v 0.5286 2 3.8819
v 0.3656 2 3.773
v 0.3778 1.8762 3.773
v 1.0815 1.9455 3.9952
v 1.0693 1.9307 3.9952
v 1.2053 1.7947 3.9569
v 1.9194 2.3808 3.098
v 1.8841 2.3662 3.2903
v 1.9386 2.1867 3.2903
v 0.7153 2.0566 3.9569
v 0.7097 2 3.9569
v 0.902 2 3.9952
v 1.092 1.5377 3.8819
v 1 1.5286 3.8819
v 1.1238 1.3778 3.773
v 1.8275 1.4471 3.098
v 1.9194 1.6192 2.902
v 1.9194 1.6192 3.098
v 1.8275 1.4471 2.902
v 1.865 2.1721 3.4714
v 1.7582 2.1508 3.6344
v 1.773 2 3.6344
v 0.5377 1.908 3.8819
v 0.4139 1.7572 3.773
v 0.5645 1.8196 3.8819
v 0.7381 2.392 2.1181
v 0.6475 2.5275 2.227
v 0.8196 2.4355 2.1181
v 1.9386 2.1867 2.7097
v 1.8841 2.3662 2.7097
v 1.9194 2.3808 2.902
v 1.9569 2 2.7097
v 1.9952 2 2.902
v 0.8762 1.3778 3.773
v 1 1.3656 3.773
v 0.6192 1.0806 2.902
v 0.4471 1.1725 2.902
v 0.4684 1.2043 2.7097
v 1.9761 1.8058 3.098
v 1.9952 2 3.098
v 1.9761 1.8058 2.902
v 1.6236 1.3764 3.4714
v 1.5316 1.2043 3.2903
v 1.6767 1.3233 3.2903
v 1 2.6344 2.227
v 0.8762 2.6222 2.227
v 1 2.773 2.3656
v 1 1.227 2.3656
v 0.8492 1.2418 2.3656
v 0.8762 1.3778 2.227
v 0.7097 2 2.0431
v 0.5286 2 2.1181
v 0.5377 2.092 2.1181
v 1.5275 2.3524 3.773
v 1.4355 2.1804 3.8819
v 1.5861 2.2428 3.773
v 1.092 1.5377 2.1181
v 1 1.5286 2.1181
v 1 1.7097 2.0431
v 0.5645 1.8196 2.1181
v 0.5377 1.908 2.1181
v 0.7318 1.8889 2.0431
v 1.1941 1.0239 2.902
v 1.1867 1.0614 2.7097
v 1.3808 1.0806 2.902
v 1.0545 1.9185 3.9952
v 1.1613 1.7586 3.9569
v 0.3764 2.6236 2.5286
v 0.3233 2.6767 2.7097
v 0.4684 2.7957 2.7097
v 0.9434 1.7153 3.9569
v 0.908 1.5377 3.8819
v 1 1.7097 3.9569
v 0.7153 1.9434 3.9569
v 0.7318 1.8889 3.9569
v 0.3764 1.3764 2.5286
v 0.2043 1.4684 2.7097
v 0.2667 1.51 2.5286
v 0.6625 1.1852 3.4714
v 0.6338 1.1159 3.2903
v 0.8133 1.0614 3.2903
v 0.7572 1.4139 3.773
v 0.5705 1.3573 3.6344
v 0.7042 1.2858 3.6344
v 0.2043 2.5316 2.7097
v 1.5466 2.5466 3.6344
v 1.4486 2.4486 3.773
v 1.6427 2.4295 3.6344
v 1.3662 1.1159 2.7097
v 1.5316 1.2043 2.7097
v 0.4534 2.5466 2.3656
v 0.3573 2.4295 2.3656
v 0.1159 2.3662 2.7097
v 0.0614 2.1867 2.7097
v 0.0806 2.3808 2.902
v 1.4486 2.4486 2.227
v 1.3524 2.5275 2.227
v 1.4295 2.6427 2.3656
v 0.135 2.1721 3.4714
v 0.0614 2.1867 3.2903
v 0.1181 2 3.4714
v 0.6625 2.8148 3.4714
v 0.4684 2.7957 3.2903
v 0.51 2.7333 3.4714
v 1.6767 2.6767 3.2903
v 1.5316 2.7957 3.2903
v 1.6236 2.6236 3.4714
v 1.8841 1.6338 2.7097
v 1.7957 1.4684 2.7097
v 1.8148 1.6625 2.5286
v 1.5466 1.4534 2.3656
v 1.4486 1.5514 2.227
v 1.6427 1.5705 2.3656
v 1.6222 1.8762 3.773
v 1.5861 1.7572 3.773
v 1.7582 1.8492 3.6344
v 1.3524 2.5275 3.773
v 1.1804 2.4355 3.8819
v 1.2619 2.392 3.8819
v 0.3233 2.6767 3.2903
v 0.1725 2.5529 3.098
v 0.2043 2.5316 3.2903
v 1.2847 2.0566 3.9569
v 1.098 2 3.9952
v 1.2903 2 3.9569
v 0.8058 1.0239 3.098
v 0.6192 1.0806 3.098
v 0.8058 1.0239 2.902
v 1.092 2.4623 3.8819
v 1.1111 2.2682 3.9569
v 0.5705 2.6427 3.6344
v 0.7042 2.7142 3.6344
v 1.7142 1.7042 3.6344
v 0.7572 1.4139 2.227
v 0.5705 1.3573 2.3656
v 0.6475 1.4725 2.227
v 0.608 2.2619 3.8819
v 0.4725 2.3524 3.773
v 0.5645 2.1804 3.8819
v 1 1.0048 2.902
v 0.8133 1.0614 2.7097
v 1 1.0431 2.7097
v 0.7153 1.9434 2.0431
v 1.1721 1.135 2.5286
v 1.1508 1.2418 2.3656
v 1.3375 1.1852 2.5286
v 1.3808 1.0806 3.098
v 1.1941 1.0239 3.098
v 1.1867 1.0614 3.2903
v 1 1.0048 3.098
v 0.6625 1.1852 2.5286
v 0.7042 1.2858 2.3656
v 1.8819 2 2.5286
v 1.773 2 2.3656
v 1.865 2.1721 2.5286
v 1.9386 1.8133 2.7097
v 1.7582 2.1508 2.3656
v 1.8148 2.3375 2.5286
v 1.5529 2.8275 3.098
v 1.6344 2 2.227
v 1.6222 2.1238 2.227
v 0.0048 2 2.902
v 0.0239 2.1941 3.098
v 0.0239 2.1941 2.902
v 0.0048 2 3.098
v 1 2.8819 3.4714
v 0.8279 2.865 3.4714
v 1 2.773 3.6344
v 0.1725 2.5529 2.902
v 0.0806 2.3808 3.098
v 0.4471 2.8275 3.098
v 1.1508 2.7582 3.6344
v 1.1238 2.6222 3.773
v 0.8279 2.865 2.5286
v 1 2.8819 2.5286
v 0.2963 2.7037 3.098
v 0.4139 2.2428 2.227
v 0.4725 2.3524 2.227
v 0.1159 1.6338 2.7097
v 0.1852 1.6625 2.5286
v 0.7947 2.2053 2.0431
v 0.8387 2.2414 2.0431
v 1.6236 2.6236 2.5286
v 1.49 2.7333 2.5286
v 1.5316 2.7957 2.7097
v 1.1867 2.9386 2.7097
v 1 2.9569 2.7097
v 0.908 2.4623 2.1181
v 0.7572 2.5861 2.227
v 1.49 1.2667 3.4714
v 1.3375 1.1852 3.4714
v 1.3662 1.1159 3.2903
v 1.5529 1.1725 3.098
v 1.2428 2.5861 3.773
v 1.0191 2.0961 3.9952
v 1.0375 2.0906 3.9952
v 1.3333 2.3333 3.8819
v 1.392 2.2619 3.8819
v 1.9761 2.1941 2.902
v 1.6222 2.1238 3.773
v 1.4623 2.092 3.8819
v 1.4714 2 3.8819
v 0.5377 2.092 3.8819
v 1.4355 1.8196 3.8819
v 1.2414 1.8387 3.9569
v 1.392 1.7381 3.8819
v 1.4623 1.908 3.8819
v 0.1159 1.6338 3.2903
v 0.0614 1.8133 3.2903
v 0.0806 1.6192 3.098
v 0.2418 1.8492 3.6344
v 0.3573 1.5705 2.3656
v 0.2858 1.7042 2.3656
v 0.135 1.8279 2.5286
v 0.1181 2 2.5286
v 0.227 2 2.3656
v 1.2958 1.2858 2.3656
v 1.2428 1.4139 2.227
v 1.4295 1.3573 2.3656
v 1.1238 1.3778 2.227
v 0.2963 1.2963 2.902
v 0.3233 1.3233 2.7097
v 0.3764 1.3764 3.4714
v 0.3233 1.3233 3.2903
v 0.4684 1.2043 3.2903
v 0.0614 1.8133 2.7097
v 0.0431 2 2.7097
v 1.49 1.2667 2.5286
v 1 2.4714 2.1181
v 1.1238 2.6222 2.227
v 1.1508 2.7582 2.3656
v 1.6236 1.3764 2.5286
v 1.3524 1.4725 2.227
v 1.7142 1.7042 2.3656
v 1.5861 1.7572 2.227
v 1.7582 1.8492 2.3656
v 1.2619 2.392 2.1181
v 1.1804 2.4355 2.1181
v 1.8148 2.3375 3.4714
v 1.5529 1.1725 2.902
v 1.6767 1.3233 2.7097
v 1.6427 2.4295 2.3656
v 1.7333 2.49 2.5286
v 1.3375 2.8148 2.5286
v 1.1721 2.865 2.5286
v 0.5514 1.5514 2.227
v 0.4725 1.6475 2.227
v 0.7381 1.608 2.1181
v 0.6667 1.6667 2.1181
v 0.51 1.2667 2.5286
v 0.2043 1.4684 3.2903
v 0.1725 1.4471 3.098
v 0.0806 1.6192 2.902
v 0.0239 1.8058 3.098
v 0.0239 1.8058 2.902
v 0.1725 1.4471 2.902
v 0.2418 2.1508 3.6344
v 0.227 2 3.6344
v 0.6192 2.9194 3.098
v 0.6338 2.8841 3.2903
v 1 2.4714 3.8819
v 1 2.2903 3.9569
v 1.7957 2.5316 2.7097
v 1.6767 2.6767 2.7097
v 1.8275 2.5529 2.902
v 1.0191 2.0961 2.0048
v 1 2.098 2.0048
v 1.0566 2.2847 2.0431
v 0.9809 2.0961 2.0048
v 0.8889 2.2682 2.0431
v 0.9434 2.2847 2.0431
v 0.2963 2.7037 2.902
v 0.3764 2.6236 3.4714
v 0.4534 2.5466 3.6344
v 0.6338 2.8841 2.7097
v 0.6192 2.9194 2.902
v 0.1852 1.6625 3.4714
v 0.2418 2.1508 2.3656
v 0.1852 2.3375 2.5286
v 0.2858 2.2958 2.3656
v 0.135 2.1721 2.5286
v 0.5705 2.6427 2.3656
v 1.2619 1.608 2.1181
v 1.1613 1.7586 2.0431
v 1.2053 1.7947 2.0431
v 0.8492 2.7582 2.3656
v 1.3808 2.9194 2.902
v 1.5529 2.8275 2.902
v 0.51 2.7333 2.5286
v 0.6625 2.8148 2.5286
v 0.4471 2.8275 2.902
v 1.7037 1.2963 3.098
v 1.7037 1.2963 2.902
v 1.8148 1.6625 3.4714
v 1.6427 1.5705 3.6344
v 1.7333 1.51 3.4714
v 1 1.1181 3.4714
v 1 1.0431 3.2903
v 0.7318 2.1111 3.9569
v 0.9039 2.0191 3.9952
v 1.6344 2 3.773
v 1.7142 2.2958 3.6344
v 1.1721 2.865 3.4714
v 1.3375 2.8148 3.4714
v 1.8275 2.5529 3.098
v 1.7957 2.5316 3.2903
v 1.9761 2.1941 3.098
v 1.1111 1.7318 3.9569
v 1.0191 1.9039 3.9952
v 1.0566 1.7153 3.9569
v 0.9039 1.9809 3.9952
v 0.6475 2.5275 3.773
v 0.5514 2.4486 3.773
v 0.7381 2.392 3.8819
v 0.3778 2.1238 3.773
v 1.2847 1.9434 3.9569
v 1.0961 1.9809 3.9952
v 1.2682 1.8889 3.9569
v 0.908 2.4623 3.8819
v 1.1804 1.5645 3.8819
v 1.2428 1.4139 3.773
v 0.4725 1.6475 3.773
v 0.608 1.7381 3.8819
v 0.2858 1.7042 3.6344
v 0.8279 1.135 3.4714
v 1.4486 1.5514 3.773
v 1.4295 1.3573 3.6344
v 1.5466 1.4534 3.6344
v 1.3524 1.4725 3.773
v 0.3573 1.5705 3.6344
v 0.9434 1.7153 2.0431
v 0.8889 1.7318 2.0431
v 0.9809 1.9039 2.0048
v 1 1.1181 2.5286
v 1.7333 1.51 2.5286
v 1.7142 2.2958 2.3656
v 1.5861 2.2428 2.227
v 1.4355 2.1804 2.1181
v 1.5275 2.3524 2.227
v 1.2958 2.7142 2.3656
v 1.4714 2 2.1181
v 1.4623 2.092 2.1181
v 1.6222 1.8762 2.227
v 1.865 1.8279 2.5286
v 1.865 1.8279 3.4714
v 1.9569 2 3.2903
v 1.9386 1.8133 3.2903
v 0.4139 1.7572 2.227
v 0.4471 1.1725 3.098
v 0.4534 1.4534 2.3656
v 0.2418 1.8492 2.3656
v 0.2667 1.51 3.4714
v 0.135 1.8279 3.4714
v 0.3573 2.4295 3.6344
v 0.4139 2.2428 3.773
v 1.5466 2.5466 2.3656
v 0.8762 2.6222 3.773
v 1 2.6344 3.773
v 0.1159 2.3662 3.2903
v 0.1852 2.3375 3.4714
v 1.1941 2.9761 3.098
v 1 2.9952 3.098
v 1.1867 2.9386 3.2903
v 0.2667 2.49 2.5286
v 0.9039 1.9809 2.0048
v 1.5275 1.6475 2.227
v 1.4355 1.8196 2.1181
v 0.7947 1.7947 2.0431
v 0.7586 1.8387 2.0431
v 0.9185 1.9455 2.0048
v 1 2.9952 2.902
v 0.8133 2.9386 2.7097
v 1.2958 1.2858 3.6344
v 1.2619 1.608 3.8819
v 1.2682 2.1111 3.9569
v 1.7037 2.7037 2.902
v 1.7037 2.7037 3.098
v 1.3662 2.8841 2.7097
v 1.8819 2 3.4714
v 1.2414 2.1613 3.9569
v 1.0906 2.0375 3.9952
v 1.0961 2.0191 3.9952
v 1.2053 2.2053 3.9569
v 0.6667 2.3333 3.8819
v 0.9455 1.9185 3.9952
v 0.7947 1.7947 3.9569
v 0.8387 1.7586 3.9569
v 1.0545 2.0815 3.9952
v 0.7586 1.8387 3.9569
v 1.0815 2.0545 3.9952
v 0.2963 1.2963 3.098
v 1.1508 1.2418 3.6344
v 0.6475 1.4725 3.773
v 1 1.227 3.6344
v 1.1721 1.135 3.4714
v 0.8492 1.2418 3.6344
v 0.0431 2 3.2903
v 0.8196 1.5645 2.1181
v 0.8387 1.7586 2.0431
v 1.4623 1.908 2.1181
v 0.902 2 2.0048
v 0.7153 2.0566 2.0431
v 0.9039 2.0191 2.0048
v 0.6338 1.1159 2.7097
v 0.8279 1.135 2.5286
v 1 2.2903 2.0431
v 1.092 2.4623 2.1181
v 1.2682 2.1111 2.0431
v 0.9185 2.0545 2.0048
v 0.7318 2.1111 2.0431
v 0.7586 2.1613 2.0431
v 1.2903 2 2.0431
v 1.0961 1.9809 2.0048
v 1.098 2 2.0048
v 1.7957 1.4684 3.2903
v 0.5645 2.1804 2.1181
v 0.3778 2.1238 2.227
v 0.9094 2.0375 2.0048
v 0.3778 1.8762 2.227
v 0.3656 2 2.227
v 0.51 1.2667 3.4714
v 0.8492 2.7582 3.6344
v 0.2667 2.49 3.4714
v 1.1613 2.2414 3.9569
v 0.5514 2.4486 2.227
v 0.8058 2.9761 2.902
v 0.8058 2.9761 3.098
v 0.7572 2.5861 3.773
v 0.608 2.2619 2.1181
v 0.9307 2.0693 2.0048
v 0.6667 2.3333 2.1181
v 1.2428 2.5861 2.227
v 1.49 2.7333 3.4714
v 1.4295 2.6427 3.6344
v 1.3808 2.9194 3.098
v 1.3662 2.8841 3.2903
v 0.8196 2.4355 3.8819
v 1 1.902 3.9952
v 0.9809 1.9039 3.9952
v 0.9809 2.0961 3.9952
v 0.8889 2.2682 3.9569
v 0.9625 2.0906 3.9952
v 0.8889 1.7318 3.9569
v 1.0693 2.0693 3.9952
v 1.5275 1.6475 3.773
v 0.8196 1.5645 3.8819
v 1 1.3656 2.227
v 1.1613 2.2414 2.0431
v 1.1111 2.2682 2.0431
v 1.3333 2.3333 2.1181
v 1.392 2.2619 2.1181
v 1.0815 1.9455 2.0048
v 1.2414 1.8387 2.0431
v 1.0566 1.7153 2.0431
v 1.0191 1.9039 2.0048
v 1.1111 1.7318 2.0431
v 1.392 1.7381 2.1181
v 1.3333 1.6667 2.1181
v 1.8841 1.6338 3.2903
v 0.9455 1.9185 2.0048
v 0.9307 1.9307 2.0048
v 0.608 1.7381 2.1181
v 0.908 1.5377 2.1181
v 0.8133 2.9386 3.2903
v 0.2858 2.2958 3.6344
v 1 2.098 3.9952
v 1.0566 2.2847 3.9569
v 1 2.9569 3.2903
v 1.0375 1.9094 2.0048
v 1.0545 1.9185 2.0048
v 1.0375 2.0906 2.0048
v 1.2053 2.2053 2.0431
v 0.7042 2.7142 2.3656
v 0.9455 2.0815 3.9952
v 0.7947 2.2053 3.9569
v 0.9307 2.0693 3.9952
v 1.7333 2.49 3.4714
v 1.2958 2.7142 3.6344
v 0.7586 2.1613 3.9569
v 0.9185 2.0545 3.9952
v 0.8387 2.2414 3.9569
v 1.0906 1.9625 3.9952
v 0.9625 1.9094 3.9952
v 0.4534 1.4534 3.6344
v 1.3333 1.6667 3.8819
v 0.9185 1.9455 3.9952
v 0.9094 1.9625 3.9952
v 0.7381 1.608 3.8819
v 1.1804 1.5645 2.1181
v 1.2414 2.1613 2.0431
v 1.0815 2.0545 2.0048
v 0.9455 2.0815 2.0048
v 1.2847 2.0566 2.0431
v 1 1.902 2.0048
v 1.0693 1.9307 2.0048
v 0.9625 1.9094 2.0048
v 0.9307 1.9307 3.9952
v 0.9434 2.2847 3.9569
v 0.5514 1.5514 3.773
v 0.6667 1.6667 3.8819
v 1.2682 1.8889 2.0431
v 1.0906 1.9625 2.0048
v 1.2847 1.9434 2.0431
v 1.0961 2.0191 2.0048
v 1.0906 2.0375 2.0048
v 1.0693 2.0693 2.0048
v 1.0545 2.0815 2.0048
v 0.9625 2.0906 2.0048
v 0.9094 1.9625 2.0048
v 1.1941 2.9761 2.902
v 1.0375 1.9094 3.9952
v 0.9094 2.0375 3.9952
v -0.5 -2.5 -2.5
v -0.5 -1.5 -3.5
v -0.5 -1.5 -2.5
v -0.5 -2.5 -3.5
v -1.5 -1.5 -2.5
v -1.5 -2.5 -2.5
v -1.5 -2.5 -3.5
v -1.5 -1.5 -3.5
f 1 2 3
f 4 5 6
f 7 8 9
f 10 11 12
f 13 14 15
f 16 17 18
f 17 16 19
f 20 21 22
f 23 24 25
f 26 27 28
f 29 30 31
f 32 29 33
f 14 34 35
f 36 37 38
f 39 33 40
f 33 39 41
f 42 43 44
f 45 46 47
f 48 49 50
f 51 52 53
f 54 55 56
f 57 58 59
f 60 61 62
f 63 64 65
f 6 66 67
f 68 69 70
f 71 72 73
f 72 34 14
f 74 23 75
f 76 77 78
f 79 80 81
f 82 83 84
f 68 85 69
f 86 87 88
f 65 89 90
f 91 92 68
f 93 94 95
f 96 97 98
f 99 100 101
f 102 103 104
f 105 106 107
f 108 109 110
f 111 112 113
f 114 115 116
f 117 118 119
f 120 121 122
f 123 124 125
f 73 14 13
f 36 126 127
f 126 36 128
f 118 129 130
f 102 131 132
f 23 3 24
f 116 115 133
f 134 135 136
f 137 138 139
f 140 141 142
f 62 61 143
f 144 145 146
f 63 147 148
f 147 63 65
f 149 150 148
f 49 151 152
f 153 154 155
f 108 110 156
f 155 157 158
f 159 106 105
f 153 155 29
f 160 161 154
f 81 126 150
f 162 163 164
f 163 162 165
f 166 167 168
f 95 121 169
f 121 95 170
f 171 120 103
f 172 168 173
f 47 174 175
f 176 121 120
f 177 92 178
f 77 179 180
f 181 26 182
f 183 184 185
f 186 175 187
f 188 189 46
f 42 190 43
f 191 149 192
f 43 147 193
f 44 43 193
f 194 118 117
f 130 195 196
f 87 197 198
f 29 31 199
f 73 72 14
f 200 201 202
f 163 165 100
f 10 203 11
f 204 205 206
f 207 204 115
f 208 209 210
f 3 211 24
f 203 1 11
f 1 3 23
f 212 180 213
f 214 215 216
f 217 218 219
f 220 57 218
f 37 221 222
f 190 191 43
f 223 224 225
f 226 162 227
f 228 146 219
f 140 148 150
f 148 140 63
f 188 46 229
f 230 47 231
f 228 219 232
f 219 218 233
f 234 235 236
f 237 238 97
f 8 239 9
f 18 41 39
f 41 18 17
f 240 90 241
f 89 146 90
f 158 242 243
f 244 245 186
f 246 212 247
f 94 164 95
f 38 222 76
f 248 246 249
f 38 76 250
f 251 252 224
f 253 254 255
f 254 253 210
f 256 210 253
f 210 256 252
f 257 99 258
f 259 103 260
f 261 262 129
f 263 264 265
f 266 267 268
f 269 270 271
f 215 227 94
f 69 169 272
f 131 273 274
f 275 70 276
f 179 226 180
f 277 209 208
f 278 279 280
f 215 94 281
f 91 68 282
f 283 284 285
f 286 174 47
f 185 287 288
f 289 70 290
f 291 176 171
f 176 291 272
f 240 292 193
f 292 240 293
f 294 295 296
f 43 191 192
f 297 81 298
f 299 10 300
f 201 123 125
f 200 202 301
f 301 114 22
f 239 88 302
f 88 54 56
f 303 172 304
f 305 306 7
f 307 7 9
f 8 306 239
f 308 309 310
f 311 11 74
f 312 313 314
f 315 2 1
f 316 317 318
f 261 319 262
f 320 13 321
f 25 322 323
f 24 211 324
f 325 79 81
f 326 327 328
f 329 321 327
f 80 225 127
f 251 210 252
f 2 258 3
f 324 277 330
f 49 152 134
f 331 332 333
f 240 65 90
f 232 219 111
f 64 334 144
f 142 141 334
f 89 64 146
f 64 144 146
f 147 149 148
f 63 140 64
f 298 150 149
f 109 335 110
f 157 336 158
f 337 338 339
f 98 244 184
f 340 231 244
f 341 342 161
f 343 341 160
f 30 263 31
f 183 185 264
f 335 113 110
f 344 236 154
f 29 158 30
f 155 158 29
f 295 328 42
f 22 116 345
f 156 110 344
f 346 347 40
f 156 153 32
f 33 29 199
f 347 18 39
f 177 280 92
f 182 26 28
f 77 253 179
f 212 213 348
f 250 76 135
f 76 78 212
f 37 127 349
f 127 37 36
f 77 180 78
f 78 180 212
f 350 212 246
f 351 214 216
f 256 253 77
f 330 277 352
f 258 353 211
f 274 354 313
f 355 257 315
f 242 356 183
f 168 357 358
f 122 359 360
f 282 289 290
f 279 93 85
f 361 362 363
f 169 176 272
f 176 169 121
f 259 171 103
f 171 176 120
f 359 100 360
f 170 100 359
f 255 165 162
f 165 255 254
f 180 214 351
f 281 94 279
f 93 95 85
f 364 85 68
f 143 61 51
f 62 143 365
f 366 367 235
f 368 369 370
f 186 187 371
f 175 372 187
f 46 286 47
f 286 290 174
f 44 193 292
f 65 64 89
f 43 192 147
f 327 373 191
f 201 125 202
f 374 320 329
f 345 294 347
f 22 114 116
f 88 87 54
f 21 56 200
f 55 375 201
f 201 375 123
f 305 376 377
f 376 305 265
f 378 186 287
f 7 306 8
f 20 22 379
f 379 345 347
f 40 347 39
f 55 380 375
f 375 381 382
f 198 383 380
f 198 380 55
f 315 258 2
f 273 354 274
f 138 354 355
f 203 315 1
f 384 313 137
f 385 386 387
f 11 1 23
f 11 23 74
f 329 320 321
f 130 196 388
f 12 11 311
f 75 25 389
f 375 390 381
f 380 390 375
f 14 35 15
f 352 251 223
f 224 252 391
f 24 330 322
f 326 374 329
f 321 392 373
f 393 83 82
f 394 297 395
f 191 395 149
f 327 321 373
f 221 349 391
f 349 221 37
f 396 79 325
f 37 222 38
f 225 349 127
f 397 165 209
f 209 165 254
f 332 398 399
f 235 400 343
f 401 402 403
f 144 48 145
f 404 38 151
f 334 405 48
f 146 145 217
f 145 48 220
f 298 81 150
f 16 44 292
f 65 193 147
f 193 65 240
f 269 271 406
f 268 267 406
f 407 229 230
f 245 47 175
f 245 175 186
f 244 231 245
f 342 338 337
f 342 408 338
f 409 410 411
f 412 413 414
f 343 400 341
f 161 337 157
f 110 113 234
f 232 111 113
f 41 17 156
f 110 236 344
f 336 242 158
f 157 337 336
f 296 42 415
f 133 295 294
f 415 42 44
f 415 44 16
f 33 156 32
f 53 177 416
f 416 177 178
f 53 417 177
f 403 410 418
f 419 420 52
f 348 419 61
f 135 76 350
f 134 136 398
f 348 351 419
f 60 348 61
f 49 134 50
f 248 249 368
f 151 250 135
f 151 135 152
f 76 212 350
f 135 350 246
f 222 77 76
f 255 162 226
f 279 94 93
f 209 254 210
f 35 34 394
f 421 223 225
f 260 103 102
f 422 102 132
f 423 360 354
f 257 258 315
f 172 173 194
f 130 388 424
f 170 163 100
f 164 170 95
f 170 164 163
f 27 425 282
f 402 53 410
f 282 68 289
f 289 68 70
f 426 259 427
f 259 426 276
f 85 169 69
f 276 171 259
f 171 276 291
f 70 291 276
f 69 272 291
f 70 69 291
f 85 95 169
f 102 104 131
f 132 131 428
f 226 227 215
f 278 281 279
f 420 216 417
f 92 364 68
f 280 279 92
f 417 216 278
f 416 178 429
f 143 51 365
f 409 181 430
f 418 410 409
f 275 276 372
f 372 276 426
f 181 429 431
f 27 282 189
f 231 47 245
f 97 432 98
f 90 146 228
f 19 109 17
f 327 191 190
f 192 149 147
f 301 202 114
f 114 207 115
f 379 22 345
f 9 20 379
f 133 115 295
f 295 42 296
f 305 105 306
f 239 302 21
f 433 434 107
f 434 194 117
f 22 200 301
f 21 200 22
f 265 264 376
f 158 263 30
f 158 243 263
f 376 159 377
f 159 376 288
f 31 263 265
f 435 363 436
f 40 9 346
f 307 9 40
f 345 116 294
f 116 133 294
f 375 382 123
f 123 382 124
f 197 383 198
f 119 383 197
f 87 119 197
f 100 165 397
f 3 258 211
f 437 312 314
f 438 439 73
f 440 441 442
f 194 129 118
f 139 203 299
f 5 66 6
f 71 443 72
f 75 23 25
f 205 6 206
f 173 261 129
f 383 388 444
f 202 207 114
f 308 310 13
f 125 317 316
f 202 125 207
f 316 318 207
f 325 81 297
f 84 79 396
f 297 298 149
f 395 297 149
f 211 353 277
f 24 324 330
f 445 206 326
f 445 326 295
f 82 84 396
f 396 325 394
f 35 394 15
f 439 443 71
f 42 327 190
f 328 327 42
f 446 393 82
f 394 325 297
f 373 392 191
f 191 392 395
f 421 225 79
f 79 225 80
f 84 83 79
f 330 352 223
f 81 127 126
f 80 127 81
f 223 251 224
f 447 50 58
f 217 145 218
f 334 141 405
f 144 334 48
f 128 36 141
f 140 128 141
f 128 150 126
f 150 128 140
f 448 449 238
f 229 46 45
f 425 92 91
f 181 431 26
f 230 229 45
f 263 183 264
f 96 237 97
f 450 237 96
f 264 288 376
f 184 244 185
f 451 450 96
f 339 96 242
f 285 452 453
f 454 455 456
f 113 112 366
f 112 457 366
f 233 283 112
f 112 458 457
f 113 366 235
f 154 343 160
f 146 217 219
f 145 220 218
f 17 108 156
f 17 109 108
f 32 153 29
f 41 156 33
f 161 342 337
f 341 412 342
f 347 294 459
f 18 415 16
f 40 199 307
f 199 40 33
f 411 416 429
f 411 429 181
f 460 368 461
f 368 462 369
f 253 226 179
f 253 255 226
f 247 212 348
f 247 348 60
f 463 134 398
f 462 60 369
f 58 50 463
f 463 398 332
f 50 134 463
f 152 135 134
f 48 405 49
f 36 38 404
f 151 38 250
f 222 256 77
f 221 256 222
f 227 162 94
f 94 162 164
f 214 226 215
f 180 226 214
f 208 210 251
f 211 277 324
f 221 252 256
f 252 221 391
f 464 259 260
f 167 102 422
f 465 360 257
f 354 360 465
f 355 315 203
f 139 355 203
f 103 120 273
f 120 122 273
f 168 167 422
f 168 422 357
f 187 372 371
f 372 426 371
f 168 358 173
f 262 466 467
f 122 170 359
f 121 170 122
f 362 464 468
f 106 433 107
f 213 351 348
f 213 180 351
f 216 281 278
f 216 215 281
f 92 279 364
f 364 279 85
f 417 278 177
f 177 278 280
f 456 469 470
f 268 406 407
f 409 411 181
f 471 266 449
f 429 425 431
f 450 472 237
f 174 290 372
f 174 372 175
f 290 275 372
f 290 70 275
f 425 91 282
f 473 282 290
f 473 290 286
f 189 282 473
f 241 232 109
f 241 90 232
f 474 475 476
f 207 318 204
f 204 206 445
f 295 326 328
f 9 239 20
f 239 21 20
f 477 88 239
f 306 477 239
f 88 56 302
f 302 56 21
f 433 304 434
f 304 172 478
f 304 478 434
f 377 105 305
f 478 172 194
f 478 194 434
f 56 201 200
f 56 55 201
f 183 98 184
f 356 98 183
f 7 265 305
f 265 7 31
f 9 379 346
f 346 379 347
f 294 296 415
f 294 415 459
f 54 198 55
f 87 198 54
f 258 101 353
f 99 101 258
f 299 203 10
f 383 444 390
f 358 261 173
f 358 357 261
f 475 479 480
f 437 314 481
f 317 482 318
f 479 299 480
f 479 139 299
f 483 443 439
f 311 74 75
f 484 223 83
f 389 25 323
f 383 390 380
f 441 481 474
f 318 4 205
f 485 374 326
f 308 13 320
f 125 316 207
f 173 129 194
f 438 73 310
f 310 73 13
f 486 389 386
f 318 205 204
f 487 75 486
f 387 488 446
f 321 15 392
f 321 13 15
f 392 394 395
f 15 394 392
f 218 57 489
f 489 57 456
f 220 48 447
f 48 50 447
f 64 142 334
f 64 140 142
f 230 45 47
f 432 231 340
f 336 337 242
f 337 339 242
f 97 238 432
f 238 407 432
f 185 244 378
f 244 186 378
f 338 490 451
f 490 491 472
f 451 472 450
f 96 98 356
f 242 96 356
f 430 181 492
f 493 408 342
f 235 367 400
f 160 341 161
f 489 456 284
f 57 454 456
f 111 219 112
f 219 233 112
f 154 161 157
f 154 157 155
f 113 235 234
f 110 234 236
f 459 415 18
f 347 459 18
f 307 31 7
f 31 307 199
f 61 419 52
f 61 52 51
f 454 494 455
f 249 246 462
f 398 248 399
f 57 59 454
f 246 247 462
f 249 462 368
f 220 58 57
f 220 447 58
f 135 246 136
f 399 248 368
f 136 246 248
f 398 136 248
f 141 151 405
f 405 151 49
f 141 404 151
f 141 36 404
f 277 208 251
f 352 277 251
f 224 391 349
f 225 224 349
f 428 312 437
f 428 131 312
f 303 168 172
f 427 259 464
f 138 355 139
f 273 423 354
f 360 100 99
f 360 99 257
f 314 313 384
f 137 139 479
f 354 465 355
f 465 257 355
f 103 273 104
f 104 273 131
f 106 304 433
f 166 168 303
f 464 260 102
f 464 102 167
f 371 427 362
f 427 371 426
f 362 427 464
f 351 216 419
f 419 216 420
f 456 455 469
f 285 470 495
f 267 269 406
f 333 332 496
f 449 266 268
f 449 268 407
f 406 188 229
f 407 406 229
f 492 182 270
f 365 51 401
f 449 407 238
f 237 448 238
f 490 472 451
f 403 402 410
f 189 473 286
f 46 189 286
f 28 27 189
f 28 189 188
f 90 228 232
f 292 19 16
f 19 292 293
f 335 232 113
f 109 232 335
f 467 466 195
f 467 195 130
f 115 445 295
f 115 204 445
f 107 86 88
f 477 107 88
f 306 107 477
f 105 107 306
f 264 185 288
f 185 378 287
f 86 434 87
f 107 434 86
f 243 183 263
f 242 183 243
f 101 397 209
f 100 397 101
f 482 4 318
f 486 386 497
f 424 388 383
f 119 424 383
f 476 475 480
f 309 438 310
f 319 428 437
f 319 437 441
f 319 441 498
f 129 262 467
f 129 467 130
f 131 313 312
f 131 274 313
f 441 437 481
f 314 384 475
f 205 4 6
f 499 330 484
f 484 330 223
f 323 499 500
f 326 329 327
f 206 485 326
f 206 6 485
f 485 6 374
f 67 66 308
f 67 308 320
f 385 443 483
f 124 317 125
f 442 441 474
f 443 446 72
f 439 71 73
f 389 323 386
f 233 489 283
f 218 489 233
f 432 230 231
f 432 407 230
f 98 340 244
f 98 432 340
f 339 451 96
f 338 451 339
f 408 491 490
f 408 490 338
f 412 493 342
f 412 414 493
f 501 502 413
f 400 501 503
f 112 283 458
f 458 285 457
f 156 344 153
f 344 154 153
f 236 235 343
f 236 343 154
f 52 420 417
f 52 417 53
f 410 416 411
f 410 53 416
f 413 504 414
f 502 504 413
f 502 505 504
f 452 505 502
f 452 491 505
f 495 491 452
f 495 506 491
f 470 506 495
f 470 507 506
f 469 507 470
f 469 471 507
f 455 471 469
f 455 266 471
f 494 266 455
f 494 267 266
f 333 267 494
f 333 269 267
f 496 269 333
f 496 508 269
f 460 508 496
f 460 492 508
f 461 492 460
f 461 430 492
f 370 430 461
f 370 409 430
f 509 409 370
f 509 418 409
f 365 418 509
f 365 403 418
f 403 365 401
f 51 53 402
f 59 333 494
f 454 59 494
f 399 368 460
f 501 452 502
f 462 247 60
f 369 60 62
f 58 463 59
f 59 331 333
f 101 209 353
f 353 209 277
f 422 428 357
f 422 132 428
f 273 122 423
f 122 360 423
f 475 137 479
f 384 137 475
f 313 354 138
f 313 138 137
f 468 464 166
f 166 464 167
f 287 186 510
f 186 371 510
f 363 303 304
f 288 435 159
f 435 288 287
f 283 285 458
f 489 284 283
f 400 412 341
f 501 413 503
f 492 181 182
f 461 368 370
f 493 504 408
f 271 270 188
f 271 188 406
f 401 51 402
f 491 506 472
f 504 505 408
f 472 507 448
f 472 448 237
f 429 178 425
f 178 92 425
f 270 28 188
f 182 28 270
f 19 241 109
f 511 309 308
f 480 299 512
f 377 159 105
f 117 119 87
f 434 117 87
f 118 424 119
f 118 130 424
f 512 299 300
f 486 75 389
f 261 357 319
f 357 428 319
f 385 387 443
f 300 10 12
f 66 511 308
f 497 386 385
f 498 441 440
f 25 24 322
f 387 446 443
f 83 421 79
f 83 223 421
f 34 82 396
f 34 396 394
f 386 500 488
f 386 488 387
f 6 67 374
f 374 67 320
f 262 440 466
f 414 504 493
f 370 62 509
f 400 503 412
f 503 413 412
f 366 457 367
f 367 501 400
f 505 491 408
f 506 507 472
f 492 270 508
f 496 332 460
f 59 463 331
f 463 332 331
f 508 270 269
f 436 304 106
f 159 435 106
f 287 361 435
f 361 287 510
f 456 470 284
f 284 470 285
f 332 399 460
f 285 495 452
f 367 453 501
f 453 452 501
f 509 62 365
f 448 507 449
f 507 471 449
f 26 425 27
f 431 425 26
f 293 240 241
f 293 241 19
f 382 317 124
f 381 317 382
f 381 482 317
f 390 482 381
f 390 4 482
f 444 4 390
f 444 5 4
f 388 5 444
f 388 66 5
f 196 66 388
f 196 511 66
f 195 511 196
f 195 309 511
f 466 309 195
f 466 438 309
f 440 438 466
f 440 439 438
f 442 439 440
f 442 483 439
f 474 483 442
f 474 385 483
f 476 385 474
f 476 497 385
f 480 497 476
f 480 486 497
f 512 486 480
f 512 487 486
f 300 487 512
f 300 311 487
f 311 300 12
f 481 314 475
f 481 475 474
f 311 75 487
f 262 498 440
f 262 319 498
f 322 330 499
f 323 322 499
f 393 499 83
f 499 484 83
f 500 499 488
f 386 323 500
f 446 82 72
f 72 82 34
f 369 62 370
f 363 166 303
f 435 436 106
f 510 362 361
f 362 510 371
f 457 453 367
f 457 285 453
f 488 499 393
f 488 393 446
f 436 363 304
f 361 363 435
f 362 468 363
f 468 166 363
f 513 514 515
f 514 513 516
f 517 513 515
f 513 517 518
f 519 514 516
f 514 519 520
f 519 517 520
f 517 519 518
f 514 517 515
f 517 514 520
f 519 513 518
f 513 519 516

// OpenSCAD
// file: Scon.scad
function scon_value(data,path,default = function(path) undef,dist = 0) =
  (len(path) <= dist || is_undef(data)) ?
    (is_undef(data) ? default(path) : data) :
    let (
      key = path[dist],
      next = is_undef(key) ?
        data :
	is_string(key) ?
          _scon_map(data, key, path) :
          _scon_index(data, key, path)
    ) scon_value(next, path, default, dist + 1);

function _scon_map(map, key, path) =
    let (result = search([key], map,0)[0])
      len(result) > 0 ? map[result[len(result)-1]][1] : undef;

function _scon_index(list, index, path) =
    (is_list(list) && 0 <= index && index < len(list)) ? list[index] : undef;

function _scon_is_mapping(data) =
    is_list(data) && len(data) == 2 && is_string(data[0]);


function _scon_all_seq(seq,begin,end) =
  begin >= end ? true : seq(begin) && _scon_all_seq(seq,begin+1,end);

function _scon_is_map(data) =
    is_list(data) &&
    _scon_all_seq(function(i) _scon_is_mapping(data[i]),0,len(data));

scon_make = function(scon,base=undef)
  is_undef(base) ?
    function(path,missing=undef)
      scon_value(scon,path,function (missing_path) missing)
  :
    function(path,missing=undef)
      scon_value(scon,path,function (missing_path) base(missing_path,missing));


function _scon_str_seq(seq,begin,end) = // str(seq(begin),...,seq(end-1))
  let (n = (begin < end) ? end - begin : 0,
       m = ((n % 2) == 0) ? n/2 : (n-1) / 2)
  n > 1 ? str(_scon_str_seq(seq,begin,begin+m),_scon_str_seq(seq,begin+m,end)) :
  n == 1 ? str(seq(begin)) : "";

function _scon_str_list(list,begin=0,_end=undef) =
  let (seq = function (i) list[i],end = is_undef(_end) ? len(list) : _end)
  str_seq(seq,begin,end);

// sep can also be a lamba function of the index
function _scon_str_join_seq(seq,begin,end,sep=",") =
  let (n = (begin < end) ? end - begin : 0,
       m = ((n % 2) == 0) ? n/2 : (n-1) / 2)
  n > 1 ? str(_scon_str_join_seq(seq,begin,begin+m,sep),is_function(sep) ? sep(begin+m-1) : sep,_scon_str_join_seq(seq,begin+m,end,sep)) :
  n == 1 ? str(seq(begin)) : "";

function _scon_str_join_list(list,begin=0,_end=undef,sep=",") =
  let (seq = function (i) list[i],end = is_undef(_end) ? len(list) : _end)
  _scon_str_join_seq(seq,begin,end,sep);

function _scon_idigit(number,radix,position) =
  floor(number / pow(radix,position)) % radix;

function _scon_sdigit(number,radix,position) =
  let (digit = _scon_idigit(number,radix,position))
  (digit < 10 ? chr(ord("0")+digit) : chr(ord("a")-10+digit));

function _scon_hex(number,digits) = 
  _scon_str_seq(function(i) _scon_sdigit(number,16,digits-1-i),0,digits);
  
function _scon_json_chr(c) =
  (c == "\"") ? "\\\"" :
  (c == "\'") ? "\\\'" :
  (c == "\n") ? "\\n" :
  (c == "\r") ? "\\r" :
  (c == "\t") ? "\\t" :
  (ord(c) >= 32 && ord(c) <= 127) ? c :
  (ord(c) < 128) ? str("\\x",_scon_hex(ord(c),2)) :
  (ord(c) < 65536) ? str("\\u",_scon_hex(ord(c),4)) :
  str("\\U",_scon_hex(ord(c),6));
  
function _scon_json_str(scon) =
  let (seq=function (i) _scon_json_chr(scon[i]))
  str("\"",_scon_str_seq(seq,0,len(scon)),"\"");

function _scon_json_map(scon) =
  let(seq=function(i) str(_scon_json_str(scon[i][0]),":",scon_json(scon[i][1])))
  str("{",_scon_str_join_seq(seq,0,len(scon)),"}");

function _scon_json_list(scon) =
  let(seq=function(i) scon_json(scon[i]))
  str("[",_scon_str_join_seq(seq,0,len(scon)),"]");

function scon_json(scon) =
  is_undef(scon) ? "null" :
  is_bool(scon) ? str(scon) :
  is_num(scon) ? str(scon) :
  is_string(scon) ? _scon_json_str(scon) :
  _scon_is_map(scon) ? _scon_json_map(scon) :
  is_list(scon) ? _scon_json_list(scon) :
  _scon_json_str("??? ",scon," ???");
  
// main file
include <Scon.scad>

sphere_scon = [
  ["radius",1],
  ["center",[1,2,3]],
  ["color",[1,1,0]],
  ["fn",32]
];

cube_scon = [
  ["size",1],
  ["center",[-1,-2,-3]],
  ["color",[0,0,1]],
];

cfg_scon = [
  ["sphere", sphere_scon],
  ["cube", cube_scon]
];

// makes a convenient accessor function
cfg = scon_make(cfg_scon);

sphere_radius=cfg(["sphere","radius"],1);
sphere_center=cfg(["sphere","center"],[0,0,0]);
sphere_color=cfg(["sphere","color"],[1,1,0]);
sphere_fn=cfg(["sphere","fn"],32);
color(sphere_color) translate(sphere_center) sphere(r=sphere_radius,$fn=sphere_fn);

cube_size=cfg(["cube","size"],[1,1,1]);
cube_center=cfg(["cube","center"],[0,0,0]);
cube_color=cfg(["cube","color"],[1,1,0]);
color(cube_color) translate(cube_center) cube(size=cube_size,center=true);
